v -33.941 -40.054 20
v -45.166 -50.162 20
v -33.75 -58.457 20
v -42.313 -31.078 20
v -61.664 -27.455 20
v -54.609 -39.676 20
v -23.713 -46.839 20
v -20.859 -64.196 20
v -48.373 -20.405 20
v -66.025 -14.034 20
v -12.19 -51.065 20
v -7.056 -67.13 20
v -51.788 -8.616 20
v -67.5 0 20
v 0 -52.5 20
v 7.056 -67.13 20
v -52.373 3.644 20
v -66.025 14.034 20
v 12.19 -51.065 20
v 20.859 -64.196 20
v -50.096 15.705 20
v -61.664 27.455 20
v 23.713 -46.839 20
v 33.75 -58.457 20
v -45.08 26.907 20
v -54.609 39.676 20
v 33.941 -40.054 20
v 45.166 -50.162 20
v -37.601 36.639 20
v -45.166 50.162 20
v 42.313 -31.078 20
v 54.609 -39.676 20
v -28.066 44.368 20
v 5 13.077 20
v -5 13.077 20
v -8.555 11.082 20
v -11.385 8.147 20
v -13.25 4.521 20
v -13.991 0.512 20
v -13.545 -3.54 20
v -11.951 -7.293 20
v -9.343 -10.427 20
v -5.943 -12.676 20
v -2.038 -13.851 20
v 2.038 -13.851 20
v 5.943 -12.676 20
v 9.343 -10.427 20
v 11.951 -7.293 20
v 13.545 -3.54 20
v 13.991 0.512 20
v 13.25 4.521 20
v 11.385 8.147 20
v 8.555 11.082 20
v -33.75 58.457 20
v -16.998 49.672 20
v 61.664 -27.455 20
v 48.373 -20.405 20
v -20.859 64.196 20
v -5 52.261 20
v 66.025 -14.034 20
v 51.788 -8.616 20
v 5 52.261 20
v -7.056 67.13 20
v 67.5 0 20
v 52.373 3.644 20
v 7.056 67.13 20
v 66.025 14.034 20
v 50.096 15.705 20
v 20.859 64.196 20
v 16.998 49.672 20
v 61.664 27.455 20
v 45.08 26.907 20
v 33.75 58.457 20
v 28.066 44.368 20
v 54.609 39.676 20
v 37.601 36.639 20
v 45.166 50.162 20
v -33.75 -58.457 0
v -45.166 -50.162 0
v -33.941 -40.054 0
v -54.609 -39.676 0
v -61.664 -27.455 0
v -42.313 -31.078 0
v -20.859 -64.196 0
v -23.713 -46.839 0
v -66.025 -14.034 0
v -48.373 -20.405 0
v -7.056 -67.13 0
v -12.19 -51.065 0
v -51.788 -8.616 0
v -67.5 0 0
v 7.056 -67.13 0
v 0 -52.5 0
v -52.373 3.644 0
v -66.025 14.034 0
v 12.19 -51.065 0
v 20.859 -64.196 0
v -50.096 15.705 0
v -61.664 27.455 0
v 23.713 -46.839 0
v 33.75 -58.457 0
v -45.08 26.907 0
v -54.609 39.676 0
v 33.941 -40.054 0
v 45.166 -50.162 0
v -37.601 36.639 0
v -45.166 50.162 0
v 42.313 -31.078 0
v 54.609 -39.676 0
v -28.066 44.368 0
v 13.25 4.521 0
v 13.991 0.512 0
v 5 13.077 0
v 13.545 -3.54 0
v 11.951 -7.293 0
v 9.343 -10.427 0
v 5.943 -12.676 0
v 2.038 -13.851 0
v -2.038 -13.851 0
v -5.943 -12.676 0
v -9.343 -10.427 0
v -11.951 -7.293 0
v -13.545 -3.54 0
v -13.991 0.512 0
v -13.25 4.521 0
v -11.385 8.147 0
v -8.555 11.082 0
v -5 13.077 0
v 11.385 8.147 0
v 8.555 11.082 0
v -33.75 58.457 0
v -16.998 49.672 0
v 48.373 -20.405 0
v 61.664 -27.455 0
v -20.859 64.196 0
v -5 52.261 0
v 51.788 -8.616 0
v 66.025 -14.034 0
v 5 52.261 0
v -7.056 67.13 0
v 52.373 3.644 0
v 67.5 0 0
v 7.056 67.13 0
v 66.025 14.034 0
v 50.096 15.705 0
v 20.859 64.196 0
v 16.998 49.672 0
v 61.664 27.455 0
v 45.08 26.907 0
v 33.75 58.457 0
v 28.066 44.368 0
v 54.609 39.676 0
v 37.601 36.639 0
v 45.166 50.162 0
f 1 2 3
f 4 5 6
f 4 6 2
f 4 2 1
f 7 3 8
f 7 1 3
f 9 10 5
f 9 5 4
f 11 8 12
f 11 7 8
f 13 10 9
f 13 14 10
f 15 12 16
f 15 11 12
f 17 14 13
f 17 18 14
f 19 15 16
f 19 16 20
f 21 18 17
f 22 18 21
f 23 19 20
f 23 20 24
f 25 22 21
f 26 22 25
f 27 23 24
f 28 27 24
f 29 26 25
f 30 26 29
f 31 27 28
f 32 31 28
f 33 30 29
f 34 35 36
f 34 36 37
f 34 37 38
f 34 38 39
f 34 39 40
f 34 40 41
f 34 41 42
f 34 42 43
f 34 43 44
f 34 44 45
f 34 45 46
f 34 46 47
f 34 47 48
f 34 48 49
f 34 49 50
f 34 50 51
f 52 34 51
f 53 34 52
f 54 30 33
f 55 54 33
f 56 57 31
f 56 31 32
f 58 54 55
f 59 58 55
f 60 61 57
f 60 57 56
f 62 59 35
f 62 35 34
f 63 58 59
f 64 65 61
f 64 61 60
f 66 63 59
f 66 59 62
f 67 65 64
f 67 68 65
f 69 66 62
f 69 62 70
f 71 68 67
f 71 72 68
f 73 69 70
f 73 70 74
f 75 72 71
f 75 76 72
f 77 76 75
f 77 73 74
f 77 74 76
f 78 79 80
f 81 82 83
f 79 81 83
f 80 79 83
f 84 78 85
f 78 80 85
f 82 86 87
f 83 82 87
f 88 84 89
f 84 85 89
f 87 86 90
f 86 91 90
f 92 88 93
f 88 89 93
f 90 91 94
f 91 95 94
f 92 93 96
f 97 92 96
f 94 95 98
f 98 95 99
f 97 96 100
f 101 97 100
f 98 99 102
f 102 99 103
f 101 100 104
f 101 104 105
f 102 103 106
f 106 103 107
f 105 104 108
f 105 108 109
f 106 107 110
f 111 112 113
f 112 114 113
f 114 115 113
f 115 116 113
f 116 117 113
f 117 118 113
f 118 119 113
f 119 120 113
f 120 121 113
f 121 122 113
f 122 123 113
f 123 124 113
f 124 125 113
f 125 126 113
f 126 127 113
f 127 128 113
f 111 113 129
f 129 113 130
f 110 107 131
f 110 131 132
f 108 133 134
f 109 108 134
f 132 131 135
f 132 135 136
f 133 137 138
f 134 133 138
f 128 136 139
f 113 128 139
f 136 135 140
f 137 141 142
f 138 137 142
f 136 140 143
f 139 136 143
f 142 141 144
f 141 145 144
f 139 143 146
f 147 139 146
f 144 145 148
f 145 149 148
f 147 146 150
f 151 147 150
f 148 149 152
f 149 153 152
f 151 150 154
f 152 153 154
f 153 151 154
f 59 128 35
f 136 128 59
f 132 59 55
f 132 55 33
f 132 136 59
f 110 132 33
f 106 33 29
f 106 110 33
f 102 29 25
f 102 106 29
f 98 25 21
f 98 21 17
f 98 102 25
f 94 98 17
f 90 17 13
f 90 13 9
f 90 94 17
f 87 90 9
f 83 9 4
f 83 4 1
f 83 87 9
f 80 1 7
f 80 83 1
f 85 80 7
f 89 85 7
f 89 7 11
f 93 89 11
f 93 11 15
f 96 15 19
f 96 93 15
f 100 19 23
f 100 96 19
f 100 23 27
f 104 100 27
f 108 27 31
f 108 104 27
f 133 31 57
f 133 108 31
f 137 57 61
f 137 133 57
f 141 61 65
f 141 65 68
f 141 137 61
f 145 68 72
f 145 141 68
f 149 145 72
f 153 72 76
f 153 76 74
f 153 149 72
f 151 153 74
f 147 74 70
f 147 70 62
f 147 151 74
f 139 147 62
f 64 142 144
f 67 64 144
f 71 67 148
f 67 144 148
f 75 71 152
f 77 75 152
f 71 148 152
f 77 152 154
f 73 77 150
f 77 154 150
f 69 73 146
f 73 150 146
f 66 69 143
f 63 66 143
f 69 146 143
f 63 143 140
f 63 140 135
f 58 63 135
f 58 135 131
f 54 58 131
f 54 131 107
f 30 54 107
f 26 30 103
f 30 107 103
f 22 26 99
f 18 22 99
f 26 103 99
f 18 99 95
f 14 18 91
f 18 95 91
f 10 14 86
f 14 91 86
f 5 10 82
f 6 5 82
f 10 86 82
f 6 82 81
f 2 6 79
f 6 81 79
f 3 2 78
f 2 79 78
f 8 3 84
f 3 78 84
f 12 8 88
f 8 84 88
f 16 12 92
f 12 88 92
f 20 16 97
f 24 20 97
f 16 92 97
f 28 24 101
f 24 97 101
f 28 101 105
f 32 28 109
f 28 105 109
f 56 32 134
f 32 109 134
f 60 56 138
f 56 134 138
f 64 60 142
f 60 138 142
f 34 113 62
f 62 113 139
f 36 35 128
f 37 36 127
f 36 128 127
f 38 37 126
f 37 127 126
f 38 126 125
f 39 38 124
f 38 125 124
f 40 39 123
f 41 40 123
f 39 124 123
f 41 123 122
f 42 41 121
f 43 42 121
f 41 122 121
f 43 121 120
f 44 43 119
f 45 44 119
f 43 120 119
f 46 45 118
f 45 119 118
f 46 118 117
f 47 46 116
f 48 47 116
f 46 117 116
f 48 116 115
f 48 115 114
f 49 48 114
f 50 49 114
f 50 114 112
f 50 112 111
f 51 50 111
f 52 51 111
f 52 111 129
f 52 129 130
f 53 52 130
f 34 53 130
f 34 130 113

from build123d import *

# Parameters (mm, degrees)
F1_R     = 67.5
F1_R_2   = 52.5
F2_DEPTH = 20
F3_R     = 14
F4_DEPTH = 20
F5_W     = 10
F5_H     = 39.4233031694
F6_DEPTH = 20


with BuildPart() as f2:
    # F1 (on Top) → F2 (new body)
    with BuildSketch(Plane.XY):
        Circle(F1_R)
        Circle(F1_R_2, mode=Mode.SUBTRACT)
    extrude(amount=F2_DEPTH)



with BuildPart() as f4:
    # F3 (on Top) → F4 (new body)
    with BuildSketch(Plane.XY):
        Circle(F3_R)
    extrude(amount=F4_DEPTH)


with BuildPart() as f2_1:
    add(f2.part)

    add(f4.part)  # F6 merges F4
    # F5 (on Top) → F6 (join)
    with BuildSketch(Plane.XY):
        with Locations((0, 32.7883484153)):
            Rectangle(F5_W, F5_H)
    extrude(amount=F6_DEPTH)


solid = f2_1.part
